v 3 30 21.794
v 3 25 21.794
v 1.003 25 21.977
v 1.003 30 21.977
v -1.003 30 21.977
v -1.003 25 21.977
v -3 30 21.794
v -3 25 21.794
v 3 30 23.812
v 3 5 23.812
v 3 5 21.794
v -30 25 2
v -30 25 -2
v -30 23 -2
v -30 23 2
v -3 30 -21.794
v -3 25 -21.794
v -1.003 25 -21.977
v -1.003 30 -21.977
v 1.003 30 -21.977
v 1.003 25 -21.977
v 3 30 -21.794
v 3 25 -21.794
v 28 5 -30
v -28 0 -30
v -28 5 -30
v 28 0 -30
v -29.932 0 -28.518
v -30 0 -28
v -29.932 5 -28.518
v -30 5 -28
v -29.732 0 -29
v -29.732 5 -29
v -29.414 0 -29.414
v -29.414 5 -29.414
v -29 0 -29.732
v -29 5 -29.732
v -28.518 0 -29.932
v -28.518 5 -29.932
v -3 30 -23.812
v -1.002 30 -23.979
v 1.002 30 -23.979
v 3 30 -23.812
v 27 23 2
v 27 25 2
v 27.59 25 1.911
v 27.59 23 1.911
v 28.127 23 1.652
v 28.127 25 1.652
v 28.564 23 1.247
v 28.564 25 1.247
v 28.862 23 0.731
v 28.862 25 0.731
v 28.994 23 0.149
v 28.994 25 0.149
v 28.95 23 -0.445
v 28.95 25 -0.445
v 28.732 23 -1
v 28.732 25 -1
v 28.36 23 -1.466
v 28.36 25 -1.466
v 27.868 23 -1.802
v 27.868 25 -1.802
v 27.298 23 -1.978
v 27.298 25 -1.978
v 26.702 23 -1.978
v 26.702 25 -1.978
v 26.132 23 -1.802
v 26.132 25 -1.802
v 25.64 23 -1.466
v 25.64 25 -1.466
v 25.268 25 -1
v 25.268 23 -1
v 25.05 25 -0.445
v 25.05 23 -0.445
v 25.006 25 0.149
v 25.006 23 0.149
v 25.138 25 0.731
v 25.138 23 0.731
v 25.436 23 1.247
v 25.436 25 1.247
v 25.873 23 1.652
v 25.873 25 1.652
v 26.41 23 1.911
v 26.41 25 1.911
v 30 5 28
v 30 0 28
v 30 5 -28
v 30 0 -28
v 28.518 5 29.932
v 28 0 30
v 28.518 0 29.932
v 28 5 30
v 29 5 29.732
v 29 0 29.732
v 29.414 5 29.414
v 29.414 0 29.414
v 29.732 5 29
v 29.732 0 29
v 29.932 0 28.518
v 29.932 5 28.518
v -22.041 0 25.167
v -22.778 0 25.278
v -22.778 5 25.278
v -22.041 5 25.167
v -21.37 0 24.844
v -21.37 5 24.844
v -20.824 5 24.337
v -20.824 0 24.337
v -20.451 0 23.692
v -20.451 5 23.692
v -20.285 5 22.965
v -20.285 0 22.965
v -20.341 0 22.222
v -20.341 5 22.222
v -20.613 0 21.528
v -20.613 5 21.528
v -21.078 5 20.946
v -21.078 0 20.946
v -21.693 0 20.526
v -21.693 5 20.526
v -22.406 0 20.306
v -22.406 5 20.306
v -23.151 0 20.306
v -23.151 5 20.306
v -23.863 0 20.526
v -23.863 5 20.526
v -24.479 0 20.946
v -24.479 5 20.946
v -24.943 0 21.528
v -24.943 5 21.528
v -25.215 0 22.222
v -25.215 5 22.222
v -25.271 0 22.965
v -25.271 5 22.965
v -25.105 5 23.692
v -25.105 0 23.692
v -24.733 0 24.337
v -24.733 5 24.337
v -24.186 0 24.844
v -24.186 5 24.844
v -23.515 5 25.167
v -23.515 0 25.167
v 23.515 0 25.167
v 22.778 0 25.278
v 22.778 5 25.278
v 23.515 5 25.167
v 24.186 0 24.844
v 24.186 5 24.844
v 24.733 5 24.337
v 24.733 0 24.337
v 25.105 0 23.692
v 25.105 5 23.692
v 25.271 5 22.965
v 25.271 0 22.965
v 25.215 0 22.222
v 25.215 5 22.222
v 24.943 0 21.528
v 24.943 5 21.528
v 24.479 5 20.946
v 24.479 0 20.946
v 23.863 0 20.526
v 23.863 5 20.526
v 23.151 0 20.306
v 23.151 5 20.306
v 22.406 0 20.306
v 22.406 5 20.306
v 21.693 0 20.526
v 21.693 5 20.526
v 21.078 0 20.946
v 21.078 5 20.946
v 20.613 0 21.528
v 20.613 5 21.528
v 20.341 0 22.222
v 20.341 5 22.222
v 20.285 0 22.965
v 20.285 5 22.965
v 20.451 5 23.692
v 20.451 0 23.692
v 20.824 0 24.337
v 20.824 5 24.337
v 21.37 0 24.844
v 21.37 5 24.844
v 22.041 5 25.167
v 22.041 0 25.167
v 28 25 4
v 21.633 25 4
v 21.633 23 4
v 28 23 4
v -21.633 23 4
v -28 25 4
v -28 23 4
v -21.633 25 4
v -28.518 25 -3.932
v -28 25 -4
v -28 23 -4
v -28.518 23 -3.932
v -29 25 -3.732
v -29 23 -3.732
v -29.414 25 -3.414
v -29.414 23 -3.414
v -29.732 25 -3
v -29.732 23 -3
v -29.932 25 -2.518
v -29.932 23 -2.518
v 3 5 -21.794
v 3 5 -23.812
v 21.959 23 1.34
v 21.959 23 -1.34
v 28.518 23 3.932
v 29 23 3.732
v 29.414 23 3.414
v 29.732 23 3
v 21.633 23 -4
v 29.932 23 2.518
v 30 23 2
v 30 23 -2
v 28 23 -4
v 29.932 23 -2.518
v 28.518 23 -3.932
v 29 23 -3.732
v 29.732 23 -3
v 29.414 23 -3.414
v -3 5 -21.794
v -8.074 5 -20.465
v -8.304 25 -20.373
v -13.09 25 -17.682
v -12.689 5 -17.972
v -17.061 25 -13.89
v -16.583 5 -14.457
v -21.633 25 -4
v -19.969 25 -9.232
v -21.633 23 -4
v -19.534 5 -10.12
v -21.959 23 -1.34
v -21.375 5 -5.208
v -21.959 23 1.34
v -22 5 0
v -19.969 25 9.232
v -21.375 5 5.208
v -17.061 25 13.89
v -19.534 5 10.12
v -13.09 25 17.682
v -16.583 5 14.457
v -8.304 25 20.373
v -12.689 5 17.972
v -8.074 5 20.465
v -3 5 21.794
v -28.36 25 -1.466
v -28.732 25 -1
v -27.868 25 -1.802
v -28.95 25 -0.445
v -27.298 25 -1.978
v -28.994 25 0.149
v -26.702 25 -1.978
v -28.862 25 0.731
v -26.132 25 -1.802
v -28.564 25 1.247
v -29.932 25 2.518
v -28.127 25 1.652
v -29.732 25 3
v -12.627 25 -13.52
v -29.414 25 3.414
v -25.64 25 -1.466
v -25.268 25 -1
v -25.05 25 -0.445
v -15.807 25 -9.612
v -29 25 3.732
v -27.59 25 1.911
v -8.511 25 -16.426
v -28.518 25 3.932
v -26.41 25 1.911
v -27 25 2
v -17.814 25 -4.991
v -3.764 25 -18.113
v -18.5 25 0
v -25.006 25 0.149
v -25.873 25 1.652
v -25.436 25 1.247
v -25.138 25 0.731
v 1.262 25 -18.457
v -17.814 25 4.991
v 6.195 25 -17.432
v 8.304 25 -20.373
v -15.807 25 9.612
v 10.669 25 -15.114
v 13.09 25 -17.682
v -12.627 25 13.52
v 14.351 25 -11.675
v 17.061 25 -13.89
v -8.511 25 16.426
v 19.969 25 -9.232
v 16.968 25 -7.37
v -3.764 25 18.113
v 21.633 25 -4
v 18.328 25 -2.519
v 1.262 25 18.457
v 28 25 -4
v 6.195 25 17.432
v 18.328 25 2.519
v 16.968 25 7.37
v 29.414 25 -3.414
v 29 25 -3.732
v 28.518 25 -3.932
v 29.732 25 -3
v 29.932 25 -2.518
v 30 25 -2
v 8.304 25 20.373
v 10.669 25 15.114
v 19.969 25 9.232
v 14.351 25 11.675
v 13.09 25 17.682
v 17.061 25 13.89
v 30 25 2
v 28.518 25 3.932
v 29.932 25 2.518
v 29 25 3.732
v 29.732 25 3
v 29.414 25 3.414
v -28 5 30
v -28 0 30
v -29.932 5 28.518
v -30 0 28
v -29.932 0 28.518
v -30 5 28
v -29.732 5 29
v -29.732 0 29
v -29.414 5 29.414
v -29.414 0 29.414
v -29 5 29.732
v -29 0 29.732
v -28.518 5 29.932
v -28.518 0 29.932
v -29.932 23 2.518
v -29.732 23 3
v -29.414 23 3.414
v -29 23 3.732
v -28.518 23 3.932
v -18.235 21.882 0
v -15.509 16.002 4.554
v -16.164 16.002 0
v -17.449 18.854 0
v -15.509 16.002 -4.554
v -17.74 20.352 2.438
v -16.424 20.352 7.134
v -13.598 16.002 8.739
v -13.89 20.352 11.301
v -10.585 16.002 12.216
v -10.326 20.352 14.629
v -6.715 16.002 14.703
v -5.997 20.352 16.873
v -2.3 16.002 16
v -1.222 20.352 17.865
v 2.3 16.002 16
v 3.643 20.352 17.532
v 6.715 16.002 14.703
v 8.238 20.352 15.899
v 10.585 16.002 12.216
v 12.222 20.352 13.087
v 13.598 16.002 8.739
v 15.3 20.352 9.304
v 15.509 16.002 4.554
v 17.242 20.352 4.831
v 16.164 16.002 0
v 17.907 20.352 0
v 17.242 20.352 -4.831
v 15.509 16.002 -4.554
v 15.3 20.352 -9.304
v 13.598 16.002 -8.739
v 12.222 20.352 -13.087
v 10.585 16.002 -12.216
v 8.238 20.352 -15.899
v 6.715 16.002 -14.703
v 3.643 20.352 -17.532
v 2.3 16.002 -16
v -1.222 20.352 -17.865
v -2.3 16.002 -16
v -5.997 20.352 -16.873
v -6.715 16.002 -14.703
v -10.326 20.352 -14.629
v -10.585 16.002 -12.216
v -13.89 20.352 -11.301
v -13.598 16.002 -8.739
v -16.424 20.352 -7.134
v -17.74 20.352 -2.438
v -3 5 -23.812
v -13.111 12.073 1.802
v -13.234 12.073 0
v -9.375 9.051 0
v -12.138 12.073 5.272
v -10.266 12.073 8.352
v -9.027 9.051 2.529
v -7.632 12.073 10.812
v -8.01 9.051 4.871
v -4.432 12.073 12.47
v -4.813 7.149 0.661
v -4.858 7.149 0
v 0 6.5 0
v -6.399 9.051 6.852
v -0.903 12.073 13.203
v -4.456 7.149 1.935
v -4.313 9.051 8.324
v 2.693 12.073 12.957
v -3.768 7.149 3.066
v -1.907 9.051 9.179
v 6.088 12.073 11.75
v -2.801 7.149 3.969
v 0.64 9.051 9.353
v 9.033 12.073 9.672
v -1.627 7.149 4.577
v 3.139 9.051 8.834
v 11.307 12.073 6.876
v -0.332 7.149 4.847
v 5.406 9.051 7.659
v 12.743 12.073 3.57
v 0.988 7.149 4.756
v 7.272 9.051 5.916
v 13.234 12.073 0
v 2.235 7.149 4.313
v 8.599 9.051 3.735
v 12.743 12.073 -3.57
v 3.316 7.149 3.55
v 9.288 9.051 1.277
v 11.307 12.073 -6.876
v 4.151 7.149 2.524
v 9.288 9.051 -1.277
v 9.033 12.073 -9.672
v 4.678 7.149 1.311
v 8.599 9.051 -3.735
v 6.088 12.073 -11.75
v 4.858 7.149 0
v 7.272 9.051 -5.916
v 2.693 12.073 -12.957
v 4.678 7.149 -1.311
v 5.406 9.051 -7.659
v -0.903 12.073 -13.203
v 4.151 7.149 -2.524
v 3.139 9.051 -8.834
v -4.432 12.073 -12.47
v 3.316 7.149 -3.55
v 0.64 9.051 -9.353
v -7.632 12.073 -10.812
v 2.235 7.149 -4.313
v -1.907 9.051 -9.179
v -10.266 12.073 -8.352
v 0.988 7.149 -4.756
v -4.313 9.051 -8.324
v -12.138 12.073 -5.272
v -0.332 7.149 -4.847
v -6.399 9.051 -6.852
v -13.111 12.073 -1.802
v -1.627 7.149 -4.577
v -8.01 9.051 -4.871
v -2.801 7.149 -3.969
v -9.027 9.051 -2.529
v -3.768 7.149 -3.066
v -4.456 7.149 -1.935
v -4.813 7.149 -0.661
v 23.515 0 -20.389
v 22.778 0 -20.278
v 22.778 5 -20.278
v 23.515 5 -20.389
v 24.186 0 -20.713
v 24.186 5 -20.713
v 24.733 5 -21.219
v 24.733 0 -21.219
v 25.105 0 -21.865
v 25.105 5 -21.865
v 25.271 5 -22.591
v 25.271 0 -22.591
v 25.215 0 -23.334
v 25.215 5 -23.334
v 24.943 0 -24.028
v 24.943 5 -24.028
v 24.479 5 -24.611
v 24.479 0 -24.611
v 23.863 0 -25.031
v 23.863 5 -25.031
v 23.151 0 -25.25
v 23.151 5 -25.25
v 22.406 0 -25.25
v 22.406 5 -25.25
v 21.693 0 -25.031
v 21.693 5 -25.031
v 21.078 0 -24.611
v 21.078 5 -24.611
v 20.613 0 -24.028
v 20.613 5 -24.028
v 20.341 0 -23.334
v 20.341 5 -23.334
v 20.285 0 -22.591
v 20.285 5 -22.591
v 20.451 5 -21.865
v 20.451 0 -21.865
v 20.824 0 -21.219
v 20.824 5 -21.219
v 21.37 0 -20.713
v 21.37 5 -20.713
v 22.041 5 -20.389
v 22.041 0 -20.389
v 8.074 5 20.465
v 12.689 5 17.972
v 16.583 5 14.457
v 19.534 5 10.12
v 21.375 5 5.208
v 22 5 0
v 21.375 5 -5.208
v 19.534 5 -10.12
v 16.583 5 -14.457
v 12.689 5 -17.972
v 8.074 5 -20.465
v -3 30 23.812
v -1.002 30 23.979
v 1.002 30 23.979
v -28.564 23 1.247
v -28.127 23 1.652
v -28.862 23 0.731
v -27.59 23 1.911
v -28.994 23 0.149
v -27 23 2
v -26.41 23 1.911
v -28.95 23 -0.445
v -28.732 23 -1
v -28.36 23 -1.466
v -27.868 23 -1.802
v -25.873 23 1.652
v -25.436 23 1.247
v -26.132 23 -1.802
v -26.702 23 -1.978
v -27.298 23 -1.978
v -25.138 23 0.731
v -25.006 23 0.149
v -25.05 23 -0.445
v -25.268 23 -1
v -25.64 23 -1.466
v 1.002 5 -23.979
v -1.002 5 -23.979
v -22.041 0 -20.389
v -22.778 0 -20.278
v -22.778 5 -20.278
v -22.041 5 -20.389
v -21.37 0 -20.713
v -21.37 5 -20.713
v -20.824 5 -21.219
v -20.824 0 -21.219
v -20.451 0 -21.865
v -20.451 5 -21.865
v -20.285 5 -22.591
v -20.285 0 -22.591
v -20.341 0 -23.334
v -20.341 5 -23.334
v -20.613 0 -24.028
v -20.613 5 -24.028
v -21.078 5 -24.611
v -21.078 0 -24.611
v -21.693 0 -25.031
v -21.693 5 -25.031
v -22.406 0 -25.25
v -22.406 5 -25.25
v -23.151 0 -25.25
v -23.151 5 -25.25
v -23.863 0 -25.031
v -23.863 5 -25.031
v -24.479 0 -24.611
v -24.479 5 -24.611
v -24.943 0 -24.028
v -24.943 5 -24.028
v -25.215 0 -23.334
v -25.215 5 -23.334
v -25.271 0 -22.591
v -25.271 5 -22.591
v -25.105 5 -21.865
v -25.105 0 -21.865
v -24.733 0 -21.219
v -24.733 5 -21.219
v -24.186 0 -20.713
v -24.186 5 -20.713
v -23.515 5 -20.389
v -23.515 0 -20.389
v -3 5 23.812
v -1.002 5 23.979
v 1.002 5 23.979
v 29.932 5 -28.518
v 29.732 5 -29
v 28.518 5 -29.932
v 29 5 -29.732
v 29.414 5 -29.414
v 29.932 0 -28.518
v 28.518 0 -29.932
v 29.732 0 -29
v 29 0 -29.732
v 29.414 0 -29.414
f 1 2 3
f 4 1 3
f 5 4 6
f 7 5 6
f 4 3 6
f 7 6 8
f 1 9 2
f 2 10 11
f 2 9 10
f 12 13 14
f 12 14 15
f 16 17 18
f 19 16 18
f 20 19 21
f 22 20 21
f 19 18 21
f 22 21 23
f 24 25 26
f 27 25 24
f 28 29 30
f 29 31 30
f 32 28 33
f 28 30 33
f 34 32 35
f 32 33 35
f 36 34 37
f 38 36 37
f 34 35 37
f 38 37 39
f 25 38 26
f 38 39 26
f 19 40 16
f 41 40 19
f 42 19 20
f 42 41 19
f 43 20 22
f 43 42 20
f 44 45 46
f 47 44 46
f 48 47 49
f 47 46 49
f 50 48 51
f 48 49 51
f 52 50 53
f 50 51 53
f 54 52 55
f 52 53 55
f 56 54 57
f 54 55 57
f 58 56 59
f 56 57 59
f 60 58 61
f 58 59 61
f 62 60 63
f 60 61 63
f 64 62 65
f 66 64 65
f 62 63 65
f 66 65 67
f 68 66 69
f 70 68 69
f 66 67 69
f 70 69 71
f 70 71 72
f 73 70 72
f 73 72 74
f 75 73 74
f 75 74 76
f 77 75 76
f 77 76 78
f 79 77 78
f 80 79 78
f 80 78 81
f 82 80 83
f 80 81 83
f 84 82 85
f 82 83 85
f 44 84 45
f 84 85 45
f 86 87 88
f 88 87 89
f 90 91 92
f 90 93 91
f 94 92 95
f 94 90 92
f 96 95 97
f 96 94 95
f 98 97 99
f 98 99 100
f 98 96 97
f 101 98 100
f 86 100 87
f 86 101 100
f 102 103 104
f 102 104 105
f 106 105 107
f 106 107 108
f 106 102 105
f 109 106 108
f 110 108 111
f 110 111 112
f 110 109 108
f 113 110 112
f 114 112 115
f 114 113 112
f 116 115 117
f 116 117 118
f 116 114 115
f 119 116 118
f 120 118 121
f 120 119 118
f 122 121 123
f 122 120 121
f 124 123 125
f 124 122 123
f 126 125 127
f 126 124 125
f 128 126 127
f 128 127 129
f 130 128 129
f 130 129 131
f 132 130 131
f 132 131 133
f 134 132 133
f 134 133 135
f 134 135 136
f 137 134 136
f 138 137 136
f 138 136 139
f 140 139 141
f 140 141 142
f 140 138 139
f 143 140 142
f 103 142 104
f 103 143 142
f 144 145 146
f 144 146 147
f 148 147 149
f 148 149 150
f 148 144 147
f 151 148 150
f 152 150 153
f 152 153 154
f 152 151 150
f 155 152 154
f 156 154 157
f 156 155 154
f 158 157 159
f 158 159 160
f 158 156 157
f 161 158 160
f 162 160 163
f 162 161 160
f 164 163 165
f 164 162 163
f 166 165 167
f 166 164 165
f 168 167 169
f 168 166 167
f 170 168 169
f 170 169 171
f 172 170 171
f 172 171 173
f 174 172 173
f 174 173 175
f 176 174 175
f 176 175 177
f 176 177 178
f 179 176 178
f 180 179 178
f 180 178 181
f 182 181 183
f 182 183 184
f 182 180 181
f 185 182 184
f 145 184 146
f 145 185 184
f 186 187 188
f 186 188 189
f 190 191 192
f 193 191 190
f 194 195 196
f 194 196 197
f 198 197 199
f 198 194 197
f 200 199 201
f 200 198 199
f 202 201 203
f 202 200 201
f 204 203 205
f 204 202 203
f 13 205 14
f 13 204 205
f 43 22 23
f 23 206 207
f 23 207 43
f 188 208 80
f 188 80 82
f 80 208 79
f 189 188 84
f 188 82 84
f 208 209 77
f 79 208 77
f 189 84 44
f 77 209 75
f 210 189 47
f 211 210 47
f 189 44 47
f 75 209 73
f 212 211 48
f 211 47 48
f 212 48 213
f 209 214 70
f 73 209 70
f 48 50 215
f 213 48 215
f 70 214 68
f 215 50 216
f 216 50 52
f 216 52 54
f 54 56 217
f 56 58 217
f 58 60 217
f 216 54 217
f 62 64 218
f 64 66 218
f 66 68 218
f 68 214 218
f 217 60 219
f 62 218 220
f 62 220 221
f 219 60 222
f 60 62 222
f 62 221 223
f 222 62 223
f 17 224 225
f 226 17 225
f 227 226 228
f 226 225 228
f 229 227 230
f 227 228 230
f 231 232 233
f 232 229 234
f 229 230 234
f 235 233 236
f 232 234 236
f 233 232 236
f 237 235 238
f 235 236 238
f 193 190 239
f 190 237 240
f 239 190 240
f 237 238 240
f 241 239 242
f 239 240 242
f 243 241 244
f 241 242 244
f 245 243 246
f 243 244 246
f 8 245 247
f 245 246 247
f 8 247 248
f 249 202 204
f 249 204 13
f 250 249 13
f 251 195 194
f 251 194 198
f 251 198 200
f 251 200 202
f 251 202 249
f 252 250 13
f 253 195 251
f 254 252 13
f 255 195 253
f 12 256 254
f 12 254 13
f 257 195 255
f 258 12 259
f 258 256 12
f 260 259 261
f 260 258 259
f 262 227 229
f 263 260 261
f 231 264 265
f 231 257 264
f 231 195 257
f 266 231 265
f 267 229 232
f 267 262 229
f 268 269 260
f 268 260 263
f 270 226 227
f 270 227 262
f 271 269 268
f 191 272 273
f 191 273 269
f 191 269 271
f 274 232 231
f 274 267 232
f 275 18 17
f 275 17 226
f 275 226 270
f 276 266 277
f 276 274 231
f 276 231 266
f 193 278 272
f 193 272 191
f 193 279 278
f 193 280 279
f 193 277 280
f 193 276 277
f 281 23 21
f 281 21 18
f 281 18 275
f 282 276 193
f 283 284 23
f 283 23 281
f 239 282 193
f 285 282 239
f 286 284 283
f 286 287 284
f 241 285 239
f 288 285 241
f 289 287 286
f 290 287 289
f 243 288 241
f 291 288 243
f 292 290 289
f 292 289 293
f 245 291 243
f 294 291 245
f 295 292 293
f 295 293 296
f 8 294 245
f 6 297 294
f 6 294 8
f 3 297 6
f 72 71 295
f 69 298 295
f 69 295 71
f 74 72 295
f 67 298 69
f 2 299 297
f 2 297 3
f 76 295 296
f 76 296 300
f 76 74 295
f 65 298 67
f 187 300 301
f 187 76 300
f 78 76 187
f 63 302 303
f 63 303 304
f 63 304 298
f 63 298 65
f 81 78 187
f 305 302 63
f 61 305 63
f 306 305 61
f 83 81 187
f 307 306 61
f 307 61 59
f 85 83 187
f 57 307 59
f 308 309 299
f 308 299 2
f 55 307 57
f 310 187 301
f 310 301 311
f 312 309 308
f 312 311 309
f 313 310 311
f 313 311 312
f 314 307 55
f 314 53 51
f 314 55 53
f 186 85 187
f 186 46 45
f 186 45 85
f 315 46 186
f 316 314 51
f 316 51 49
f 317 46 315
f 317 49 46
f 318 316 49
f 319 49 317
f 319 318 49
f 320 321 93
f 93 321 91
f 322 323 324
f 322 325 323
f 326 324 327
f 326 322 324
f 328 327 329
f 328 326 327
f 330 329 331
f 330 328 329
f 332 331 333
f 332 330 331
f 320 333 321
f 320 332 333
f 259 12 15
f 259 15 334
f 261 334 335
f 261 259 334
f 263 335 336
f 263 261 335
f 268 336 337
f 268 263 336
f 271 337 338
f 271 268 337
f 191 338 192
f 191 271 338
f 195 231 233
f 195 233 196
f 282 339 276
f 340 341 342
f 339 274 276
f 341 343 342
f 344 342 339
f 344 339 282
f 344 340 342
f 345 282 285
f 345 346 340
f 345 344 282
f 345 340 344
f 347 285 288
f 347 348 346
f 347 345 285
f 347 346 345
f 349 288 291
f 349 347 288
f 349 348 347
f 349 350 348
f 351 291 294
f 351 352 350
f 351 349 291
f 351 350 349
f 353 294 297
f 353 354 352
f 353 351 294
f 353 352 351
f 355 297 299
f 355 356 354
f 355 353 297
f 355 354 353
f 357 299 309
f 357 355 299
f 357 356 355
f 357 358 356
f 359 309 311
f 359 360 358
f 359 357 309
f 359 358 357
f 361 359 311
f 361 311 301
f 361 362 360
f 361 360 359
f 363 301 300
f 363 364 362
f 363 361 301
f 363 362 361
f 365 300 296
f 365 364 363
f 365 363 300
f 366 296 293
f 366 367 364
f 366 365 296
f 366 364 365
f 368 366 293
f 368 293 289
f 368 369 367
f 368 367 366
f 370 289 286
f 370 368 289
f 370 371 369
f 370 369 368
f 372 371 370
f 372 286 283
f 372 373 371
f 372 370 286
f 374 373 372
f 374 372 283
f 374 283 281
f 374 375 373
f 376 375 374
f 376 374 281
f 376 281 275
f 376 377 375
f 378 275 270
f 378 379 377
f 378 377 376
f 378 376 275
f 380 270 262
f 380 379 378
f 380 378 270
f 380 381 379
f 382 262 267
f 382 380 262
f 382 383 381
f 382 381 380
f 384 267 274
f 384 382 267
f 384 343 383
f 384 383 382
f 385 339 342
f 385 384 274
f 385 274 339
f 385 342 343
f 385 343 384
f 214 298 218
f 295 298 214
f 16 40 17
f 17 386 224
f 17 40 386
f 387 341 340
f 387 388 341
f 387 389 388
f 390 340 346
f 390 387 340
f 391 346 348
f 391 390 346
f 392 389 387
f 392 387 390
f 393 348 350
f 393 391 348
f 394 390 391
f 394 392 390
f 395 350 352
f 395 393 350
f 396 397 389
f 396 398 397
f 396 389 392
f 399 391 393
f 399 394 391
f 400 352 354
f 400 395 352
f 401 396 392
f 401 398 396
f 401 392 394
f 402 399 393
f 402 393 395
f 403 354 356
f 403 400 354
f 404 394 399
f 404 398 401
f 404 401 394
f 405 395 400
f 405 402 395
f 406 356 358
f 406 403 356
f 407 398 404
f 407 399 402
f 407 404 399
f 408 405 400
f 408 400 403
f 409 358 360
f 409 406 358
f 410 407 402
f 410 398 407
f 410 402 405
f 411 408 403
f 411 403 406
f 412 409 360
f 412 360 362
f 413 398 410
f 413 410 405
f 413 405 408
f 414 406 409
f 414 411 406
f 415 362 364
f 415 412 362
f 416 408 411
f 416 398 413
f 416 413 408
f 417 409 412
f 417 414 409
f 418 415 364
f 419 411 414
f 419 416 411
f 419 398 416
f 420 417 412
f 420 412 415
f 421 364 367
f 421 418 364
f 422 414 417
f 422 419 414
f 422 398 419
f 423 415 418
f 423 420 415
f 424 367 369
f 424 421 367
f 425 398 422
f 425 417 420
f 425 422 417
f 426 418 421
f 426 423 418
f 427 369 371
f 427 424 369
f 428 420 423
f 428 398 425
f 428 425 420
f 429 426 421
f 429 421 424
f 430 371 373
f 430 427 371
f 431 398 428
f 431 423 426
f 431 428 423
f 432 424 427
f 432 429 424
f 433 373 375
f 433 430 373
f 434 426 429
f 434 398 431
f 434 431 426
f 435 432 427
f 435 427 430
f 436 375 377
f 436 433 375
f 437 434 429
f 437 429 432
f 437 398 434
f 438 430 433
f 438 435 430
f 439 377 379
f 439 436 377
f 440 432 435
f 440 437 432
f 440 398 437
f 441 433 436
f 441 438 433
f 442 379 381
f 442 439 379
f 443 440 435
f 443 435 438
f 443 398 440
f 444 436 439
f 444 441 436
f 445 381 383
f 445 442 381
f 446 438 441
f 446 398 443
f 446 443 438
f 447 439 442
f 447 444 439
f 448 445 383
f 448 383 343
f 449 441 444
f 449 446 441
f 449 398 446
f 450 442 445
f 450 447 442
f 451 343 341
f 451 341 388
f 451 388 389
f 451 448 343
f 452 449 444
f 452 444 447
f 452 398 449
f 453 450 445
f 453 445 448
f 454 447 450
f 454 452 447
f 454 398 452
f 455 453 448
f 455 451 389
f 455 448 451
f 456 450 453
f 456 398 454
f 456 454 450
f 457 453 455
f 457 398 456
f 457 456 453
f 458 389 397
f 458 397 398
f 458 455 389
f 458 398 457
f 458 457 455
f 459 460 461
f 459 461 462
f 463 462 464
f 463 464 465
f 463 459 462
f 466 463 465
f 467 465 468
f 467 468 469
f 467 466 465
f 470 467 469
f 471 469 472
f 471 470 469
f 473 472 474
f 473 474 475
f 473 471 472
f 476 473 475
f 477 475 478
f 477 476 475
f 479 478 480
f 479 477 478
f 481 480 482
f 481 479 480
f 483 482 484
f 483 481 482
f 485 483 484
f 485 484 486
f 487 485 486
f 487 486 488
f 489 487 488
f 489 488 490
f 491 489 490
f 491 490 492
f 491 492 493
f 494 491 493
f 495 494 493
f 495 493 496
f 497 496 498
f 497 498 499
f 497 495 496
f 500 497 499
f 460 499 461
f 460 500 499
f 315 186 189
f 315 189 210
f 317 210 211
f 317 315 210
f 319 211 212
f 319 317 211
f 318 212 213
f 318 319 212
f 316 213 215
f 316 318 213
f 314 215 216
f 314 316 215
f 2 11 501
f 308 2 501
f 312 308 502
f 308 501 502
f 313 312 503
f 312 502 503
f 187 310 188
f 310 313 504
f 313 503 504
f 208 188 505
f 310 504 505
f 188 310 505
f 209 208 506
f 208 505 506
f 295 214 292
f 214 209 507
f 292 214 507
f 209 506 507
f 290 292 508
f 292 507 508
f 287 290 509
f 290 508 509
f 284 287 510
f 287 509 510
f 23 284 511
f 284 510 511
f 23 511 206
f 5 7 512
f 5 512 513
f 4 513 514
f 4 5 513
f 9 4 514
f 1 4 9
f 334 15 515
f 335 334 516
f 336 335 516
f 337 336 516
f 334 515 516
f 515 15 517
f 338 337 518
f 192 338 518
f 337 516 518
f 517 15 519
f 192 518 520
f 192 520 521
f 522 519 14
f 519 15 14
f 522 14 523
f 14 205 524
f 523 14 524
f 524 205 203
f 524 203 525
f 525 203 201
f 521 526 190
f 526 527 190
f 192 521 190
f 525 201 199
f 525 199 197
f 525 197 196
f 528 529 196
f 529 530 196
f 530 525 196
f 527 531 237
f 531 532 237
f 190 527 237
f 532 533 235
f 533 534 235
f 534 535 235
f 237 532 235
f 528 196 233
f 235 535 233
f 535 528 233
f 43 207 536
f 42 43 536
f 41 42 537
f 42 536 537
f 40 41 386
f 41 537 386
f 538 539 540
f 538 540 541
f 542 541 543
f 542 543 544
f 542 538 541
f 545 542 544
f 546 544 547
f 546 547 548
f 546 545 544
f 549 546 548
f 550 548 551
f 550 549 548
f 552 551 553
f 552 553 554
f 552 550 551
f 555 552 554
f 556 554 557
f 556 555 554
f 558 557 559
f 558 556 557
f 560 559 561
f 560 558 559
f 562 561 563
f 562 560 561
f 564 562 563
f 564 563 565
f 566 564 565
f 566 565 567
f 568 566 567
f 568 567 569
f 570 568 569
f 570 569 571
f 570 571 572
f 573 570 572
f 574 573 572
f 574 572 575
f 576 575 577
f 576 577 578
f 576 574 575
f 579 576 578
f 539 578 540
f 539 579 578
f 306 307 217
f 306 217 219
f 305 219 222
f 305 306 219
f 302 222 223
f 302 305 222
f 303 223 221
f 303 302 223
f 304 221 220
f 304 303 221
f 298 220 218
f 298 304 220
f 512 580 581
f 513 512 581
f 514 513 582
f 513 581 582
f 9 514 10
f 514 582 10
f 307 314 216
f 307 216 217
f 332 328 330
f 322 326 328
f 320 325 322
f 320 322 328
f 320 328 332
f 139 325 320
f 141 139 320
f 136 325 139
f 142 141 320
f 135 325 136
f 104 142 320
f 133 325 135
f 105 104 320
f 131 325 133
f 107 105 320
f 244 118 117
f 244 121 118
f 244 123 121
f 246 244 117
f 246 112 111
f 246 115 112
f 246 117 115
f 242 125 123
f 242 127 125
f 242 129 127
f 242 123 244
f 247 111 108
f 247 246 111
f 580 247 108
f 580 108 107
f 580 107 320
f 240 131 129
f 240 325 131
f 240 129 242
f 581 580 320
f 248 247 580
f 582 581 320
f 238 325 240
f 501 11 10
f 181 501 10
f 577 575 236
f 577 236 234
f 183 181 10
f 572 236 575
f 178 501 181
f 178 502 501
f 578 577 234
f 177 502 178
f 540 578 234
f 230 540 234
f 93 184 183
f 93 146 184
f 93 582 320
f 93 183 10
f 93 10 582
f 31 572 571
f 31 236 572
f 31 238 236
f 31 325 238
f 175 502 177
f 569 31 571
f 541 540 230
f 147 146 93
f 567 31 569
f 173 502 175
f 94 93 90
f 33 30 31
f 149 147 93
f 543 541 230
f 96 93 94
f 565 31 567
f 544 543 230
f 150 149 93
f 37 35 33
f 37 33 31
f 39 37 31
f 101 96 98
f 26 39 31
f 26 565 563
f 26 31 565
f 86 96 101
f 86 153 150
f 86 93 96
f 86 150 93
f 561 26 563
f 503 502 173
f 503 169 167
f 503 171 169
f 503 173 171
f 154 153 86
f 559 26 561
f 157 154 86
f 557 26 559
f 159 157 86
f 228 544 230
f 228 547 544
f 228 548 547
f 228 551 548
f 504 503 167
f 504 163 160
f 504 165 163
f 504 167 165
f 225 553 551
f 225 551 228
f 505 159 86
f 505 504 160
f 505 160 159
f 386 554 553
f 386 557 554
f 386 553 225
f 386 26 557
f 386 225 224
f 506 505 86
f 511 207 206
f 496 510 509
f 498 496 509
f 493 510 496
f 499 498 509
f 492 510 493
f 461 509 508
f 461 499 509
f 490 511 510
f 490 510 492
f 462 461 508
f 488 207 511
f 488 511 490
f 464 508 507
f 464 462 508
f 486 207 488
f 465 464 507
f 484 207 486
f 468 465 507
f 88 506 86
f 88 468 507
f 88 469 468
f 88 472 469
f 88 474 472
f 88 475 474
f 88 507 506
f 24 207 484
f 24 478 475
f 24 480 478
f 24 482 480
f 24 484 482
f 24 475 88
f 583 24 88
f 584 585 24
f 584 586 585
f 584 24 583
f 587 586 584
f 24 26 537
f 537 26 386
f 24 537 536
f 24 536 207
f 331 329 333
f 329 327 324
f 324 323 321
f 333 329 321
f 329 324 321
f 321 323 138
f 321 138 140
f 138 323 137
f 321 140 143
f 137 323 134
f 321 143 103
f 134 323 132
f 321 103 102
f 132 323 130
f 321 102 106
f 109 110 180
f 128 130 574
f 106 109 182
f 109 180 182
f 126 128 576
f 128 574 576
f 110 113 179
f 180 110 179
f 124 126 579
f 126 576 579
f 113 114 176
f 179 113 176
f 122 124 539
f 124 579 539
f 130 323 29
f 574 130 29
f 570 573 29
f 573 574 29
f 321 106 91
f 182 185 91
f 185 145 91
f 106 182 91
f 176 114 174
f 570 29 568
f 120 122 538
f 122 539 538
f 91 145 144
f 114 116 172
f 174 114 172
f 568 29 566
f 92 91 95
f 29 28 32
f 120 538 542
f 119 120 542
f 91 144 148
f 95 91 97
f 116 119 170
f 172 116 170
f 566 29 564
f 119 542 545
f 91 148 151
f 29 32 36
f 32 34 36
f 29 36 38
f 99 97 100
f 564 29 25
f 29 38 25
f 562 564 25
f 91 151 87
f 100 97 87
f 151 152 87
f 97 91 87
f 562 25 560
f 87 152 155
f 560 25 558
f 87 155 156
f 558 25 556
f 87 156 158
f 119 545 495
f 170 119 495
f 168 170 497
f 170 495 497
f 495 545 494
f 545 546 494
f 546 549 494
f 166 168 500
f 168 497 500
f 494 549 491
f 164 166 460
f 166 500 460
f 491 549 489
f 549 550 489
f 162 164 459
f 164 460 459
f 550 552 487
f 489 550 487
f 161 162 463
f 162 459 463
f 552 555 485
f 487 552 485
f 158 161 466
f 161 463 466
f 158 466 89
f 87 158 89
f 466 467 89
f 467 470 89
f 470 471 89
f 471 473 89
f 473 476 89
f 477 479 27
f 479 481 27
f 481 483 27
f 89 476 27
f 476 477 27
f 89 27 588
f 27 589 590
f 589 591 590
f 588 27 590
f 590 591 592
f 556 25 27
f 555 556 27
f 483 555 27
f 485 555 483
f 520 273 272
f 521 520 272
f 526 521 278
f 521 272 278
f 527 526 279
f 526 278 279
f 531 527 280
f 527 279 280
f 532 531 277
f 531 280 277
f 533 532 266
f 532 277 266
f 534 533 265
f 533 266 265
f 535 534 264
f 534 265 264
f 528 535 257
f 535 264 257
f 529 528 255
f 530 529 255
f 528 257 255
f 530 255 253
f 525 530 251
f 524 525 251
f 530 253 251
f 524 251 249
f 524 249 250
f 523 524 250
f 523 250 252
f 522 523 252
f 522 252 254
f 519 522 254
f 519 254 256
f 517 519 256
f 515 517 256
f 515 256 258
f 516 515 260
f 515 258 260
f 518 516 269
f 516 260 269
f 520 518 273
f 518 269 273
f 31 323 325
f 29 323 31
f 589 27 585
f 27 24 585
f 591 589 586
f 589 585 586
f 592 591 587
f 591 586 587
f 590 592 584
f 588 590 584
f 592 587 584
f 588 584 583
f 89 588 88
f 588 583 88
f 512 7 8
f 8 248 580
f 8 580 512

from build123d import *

# Parameters (mm, degrees)
SKETCH1_W           = 60
SKETCH1_H           = 60
SKETCH1_R           = 2.5
SKETCH1_R_2         = 22
SKETCH1_R_3         = 18.5
BOSS_EXTRUDE1_DEPTH = 5
BOSS_EXTRUDE2_START = 5
SKETCH1_3_R         = 22
SKETCH1_3_R_2       = 18.5
BOSS_EXTRUDE2_DEPTH = 20
FILLET1_R           = 2
BOSS_EXTRUDE6_DEPTH = 25
SKETCH5_R           = 2
BOSS_EXTRUDE7_DEPTH = 2


with BuildPart() as part:
    # Sketch1 → Boss-Extrude1 (new body)
    with BuildSketch(Plane(origin=(0, 0, 0), x_dir=(1, 0, 0), z_dir=(0, 1, 0))):
        Rectangle(SKETCH1_W, SKETCH1_H)
        with Locations(Location((22.778174593, 22.778174593, 0), (0, 0, 270))):
            Circle(SKETCH1_R, mode=Mode.SUBTRACT)
        with Locations(Location((22.778174593, -22.778174593, 0), (0, 0, 270))):
            Circle(SKETCH1_R, mode=Mode.SUBTRACT)
        with Locations(Location((-22.778174593, -22.778174593, 0), (0, 0, 270))):
            Circle(SKETCH1_R, mode=Mode.SUBTRACT)
        Circle(SKETCH1_R_2, mode=Mode.SUBTRACT)
        with Locations(Location((-22.778174593, 22.778174593, 0), (0, 0, 270))):
            Circle(SKETCH1_R, mode=Mode.SUBTRACT)
        Circle(SKETCH1_R_2)
        Circle(SKETCH1_R_3, mode=Mode.SUBTRACT)
        Circle(SKETCH1_R_3)
    extrude(amount=BOSS_EXTRUDE1_DEPTH)

    # Sketch1<3> → Boss-Extrude2 (add)
    with BuildSketch(Plane(origin=(0, 0, 0), x_dir=(1, 0, 0), z_dir=(0, 1, 0)).offset(BOSS_EXTRUDE2_START)):
        with Locations(Location((0, 0, 0), (0, 0, 270))):
            Circle(SKETCH1_3_R)
        Circle(SKETCH1_3_R_2, mode=Mode.SUBTRACT)
        Circle(SKETCH1_3_R_2)
    extrude(amount=BOSS_EXTRUDE2_DEPTH)

    # Sketch3 → Cut-Revolve4 (revolve, cut)
    with BuildSketch(Plane.XY):
        with BuildLine():
            Line((0, 16.001538563), (0, 25))
            Line((0, 25), (-18.5, 25))
            ThreePointArc((-18.5, 25), (-17.906501611, 20.351645447), (-16.164086481, 16.001538563))
            Line((-16.164086481, 16.001538563), (0, 16.001538563))
        make_face()
        with BuildLine():
            Line((0, 6.5), (0, 16.001538563))
            Line((0, 16.001538563), (-16.164086481, 16.001538563))
            ThreePointArc((-16.164086481, 16.001538563), (-9.374925691, 9.051308258), (0, 6.5))
        make_face()
    revolve(axis=Axis((0, 6.5, 0), (0, 1, 0)), mode=Mode.SUBTRACT)

    # Fillet1
    fillet1_edges = [part.edges().sort_by_distance(p)[0] for p in [
        (-30, 2.5, 30),
        (-30, 2.5, -30),
        (30, 2.5, -30),
        (30, 2.5, 30),
    ]]
    fillet(fillet1_edges, radius=FILLET1_R)

    # Sketch4 → Boss-Extrude6 (add)
    with BuildSketch(Plane(origin=(0, 5, 0), x_dir=(1, 0, 0), z_dir=(0, 1, 0))):
        with BuildLine():
            ThreePointArc((3, 23.8117618), (0, 24), (-3, 23.8117618))
            Line((-3, 23.8117618), (-3, 21.794494718))
            ThreePointArc((-3, 21.794494718), (0, 22), (3, 21.794494718))
            Line((3, 21.794494718), (3, 23.8117618))
        make_face()
        with BuildLine():
            Line((-3, -21.794494718), (-3, -23.8117618))
            ThreePointArc((-3, -23.8117618), (0, -24), (3, -23.8117618))
            Line((3, -23.8117618), (3, -21.794494718))
            ThreePointArc((3, -21.794494718), (0, -22), (-3, -21.794494718))
        make_face()
    extrude(amount=BOSS_EXTRUDE6_DEPTH)

    # Sketch5 → Boss-Extrude7 (add)
    with BuildSketch(Plane(origin=(0, 25, 0), x_dir=(1, 0, 0), z_dir=(0, 1, 0))):
        with BuildLine():
            ThreePointArc((30, 2), (29.414213562, 3.414213562), (28, 4))
            Line((28, 4), (21.633307653, 4))
            ThreePointArc((21.633307653, 4), (22, 0), (21.633307653, -4))
            Line((21.633307653, -4), (28, -4))
            ThreePointArc((28, -4), (29.414213562, -3.414213562), (30, -2))
            Line((30, -2), (30, 2))
        make_face()
        with Locations(Location((27, 0, 0), (0, 0, 270))):
            Circle(SKETCH5_R, mode=Mode.SUBTRACT)
        with BuildLine():
            ThreePointArc((-21.633307653, -4), (-22, 0), (-21.633307653, 4))
            Line((-21.633307653, 4), (-28, 4))
            ThreePointArc((-28, 4), (-29.414213562, 3.414213562), (-30, 2))
            Line((-30, 2), (-30, -2))
            ThreePointArc((-30, -2), (-29.414213562, -3.414213562), (-28, -4))
            Line((-28, -4), (-21.633307653, -4))
        make_face()
        with Locations(Location((-27, 0, 0), (0, 0, 270))):
            Circle(SKETCH5_R, mode=Mode.SUBTRACT)
    extrude(amount=-BOSS_EXTRUDE7_DEPTH)


solid = part.part
